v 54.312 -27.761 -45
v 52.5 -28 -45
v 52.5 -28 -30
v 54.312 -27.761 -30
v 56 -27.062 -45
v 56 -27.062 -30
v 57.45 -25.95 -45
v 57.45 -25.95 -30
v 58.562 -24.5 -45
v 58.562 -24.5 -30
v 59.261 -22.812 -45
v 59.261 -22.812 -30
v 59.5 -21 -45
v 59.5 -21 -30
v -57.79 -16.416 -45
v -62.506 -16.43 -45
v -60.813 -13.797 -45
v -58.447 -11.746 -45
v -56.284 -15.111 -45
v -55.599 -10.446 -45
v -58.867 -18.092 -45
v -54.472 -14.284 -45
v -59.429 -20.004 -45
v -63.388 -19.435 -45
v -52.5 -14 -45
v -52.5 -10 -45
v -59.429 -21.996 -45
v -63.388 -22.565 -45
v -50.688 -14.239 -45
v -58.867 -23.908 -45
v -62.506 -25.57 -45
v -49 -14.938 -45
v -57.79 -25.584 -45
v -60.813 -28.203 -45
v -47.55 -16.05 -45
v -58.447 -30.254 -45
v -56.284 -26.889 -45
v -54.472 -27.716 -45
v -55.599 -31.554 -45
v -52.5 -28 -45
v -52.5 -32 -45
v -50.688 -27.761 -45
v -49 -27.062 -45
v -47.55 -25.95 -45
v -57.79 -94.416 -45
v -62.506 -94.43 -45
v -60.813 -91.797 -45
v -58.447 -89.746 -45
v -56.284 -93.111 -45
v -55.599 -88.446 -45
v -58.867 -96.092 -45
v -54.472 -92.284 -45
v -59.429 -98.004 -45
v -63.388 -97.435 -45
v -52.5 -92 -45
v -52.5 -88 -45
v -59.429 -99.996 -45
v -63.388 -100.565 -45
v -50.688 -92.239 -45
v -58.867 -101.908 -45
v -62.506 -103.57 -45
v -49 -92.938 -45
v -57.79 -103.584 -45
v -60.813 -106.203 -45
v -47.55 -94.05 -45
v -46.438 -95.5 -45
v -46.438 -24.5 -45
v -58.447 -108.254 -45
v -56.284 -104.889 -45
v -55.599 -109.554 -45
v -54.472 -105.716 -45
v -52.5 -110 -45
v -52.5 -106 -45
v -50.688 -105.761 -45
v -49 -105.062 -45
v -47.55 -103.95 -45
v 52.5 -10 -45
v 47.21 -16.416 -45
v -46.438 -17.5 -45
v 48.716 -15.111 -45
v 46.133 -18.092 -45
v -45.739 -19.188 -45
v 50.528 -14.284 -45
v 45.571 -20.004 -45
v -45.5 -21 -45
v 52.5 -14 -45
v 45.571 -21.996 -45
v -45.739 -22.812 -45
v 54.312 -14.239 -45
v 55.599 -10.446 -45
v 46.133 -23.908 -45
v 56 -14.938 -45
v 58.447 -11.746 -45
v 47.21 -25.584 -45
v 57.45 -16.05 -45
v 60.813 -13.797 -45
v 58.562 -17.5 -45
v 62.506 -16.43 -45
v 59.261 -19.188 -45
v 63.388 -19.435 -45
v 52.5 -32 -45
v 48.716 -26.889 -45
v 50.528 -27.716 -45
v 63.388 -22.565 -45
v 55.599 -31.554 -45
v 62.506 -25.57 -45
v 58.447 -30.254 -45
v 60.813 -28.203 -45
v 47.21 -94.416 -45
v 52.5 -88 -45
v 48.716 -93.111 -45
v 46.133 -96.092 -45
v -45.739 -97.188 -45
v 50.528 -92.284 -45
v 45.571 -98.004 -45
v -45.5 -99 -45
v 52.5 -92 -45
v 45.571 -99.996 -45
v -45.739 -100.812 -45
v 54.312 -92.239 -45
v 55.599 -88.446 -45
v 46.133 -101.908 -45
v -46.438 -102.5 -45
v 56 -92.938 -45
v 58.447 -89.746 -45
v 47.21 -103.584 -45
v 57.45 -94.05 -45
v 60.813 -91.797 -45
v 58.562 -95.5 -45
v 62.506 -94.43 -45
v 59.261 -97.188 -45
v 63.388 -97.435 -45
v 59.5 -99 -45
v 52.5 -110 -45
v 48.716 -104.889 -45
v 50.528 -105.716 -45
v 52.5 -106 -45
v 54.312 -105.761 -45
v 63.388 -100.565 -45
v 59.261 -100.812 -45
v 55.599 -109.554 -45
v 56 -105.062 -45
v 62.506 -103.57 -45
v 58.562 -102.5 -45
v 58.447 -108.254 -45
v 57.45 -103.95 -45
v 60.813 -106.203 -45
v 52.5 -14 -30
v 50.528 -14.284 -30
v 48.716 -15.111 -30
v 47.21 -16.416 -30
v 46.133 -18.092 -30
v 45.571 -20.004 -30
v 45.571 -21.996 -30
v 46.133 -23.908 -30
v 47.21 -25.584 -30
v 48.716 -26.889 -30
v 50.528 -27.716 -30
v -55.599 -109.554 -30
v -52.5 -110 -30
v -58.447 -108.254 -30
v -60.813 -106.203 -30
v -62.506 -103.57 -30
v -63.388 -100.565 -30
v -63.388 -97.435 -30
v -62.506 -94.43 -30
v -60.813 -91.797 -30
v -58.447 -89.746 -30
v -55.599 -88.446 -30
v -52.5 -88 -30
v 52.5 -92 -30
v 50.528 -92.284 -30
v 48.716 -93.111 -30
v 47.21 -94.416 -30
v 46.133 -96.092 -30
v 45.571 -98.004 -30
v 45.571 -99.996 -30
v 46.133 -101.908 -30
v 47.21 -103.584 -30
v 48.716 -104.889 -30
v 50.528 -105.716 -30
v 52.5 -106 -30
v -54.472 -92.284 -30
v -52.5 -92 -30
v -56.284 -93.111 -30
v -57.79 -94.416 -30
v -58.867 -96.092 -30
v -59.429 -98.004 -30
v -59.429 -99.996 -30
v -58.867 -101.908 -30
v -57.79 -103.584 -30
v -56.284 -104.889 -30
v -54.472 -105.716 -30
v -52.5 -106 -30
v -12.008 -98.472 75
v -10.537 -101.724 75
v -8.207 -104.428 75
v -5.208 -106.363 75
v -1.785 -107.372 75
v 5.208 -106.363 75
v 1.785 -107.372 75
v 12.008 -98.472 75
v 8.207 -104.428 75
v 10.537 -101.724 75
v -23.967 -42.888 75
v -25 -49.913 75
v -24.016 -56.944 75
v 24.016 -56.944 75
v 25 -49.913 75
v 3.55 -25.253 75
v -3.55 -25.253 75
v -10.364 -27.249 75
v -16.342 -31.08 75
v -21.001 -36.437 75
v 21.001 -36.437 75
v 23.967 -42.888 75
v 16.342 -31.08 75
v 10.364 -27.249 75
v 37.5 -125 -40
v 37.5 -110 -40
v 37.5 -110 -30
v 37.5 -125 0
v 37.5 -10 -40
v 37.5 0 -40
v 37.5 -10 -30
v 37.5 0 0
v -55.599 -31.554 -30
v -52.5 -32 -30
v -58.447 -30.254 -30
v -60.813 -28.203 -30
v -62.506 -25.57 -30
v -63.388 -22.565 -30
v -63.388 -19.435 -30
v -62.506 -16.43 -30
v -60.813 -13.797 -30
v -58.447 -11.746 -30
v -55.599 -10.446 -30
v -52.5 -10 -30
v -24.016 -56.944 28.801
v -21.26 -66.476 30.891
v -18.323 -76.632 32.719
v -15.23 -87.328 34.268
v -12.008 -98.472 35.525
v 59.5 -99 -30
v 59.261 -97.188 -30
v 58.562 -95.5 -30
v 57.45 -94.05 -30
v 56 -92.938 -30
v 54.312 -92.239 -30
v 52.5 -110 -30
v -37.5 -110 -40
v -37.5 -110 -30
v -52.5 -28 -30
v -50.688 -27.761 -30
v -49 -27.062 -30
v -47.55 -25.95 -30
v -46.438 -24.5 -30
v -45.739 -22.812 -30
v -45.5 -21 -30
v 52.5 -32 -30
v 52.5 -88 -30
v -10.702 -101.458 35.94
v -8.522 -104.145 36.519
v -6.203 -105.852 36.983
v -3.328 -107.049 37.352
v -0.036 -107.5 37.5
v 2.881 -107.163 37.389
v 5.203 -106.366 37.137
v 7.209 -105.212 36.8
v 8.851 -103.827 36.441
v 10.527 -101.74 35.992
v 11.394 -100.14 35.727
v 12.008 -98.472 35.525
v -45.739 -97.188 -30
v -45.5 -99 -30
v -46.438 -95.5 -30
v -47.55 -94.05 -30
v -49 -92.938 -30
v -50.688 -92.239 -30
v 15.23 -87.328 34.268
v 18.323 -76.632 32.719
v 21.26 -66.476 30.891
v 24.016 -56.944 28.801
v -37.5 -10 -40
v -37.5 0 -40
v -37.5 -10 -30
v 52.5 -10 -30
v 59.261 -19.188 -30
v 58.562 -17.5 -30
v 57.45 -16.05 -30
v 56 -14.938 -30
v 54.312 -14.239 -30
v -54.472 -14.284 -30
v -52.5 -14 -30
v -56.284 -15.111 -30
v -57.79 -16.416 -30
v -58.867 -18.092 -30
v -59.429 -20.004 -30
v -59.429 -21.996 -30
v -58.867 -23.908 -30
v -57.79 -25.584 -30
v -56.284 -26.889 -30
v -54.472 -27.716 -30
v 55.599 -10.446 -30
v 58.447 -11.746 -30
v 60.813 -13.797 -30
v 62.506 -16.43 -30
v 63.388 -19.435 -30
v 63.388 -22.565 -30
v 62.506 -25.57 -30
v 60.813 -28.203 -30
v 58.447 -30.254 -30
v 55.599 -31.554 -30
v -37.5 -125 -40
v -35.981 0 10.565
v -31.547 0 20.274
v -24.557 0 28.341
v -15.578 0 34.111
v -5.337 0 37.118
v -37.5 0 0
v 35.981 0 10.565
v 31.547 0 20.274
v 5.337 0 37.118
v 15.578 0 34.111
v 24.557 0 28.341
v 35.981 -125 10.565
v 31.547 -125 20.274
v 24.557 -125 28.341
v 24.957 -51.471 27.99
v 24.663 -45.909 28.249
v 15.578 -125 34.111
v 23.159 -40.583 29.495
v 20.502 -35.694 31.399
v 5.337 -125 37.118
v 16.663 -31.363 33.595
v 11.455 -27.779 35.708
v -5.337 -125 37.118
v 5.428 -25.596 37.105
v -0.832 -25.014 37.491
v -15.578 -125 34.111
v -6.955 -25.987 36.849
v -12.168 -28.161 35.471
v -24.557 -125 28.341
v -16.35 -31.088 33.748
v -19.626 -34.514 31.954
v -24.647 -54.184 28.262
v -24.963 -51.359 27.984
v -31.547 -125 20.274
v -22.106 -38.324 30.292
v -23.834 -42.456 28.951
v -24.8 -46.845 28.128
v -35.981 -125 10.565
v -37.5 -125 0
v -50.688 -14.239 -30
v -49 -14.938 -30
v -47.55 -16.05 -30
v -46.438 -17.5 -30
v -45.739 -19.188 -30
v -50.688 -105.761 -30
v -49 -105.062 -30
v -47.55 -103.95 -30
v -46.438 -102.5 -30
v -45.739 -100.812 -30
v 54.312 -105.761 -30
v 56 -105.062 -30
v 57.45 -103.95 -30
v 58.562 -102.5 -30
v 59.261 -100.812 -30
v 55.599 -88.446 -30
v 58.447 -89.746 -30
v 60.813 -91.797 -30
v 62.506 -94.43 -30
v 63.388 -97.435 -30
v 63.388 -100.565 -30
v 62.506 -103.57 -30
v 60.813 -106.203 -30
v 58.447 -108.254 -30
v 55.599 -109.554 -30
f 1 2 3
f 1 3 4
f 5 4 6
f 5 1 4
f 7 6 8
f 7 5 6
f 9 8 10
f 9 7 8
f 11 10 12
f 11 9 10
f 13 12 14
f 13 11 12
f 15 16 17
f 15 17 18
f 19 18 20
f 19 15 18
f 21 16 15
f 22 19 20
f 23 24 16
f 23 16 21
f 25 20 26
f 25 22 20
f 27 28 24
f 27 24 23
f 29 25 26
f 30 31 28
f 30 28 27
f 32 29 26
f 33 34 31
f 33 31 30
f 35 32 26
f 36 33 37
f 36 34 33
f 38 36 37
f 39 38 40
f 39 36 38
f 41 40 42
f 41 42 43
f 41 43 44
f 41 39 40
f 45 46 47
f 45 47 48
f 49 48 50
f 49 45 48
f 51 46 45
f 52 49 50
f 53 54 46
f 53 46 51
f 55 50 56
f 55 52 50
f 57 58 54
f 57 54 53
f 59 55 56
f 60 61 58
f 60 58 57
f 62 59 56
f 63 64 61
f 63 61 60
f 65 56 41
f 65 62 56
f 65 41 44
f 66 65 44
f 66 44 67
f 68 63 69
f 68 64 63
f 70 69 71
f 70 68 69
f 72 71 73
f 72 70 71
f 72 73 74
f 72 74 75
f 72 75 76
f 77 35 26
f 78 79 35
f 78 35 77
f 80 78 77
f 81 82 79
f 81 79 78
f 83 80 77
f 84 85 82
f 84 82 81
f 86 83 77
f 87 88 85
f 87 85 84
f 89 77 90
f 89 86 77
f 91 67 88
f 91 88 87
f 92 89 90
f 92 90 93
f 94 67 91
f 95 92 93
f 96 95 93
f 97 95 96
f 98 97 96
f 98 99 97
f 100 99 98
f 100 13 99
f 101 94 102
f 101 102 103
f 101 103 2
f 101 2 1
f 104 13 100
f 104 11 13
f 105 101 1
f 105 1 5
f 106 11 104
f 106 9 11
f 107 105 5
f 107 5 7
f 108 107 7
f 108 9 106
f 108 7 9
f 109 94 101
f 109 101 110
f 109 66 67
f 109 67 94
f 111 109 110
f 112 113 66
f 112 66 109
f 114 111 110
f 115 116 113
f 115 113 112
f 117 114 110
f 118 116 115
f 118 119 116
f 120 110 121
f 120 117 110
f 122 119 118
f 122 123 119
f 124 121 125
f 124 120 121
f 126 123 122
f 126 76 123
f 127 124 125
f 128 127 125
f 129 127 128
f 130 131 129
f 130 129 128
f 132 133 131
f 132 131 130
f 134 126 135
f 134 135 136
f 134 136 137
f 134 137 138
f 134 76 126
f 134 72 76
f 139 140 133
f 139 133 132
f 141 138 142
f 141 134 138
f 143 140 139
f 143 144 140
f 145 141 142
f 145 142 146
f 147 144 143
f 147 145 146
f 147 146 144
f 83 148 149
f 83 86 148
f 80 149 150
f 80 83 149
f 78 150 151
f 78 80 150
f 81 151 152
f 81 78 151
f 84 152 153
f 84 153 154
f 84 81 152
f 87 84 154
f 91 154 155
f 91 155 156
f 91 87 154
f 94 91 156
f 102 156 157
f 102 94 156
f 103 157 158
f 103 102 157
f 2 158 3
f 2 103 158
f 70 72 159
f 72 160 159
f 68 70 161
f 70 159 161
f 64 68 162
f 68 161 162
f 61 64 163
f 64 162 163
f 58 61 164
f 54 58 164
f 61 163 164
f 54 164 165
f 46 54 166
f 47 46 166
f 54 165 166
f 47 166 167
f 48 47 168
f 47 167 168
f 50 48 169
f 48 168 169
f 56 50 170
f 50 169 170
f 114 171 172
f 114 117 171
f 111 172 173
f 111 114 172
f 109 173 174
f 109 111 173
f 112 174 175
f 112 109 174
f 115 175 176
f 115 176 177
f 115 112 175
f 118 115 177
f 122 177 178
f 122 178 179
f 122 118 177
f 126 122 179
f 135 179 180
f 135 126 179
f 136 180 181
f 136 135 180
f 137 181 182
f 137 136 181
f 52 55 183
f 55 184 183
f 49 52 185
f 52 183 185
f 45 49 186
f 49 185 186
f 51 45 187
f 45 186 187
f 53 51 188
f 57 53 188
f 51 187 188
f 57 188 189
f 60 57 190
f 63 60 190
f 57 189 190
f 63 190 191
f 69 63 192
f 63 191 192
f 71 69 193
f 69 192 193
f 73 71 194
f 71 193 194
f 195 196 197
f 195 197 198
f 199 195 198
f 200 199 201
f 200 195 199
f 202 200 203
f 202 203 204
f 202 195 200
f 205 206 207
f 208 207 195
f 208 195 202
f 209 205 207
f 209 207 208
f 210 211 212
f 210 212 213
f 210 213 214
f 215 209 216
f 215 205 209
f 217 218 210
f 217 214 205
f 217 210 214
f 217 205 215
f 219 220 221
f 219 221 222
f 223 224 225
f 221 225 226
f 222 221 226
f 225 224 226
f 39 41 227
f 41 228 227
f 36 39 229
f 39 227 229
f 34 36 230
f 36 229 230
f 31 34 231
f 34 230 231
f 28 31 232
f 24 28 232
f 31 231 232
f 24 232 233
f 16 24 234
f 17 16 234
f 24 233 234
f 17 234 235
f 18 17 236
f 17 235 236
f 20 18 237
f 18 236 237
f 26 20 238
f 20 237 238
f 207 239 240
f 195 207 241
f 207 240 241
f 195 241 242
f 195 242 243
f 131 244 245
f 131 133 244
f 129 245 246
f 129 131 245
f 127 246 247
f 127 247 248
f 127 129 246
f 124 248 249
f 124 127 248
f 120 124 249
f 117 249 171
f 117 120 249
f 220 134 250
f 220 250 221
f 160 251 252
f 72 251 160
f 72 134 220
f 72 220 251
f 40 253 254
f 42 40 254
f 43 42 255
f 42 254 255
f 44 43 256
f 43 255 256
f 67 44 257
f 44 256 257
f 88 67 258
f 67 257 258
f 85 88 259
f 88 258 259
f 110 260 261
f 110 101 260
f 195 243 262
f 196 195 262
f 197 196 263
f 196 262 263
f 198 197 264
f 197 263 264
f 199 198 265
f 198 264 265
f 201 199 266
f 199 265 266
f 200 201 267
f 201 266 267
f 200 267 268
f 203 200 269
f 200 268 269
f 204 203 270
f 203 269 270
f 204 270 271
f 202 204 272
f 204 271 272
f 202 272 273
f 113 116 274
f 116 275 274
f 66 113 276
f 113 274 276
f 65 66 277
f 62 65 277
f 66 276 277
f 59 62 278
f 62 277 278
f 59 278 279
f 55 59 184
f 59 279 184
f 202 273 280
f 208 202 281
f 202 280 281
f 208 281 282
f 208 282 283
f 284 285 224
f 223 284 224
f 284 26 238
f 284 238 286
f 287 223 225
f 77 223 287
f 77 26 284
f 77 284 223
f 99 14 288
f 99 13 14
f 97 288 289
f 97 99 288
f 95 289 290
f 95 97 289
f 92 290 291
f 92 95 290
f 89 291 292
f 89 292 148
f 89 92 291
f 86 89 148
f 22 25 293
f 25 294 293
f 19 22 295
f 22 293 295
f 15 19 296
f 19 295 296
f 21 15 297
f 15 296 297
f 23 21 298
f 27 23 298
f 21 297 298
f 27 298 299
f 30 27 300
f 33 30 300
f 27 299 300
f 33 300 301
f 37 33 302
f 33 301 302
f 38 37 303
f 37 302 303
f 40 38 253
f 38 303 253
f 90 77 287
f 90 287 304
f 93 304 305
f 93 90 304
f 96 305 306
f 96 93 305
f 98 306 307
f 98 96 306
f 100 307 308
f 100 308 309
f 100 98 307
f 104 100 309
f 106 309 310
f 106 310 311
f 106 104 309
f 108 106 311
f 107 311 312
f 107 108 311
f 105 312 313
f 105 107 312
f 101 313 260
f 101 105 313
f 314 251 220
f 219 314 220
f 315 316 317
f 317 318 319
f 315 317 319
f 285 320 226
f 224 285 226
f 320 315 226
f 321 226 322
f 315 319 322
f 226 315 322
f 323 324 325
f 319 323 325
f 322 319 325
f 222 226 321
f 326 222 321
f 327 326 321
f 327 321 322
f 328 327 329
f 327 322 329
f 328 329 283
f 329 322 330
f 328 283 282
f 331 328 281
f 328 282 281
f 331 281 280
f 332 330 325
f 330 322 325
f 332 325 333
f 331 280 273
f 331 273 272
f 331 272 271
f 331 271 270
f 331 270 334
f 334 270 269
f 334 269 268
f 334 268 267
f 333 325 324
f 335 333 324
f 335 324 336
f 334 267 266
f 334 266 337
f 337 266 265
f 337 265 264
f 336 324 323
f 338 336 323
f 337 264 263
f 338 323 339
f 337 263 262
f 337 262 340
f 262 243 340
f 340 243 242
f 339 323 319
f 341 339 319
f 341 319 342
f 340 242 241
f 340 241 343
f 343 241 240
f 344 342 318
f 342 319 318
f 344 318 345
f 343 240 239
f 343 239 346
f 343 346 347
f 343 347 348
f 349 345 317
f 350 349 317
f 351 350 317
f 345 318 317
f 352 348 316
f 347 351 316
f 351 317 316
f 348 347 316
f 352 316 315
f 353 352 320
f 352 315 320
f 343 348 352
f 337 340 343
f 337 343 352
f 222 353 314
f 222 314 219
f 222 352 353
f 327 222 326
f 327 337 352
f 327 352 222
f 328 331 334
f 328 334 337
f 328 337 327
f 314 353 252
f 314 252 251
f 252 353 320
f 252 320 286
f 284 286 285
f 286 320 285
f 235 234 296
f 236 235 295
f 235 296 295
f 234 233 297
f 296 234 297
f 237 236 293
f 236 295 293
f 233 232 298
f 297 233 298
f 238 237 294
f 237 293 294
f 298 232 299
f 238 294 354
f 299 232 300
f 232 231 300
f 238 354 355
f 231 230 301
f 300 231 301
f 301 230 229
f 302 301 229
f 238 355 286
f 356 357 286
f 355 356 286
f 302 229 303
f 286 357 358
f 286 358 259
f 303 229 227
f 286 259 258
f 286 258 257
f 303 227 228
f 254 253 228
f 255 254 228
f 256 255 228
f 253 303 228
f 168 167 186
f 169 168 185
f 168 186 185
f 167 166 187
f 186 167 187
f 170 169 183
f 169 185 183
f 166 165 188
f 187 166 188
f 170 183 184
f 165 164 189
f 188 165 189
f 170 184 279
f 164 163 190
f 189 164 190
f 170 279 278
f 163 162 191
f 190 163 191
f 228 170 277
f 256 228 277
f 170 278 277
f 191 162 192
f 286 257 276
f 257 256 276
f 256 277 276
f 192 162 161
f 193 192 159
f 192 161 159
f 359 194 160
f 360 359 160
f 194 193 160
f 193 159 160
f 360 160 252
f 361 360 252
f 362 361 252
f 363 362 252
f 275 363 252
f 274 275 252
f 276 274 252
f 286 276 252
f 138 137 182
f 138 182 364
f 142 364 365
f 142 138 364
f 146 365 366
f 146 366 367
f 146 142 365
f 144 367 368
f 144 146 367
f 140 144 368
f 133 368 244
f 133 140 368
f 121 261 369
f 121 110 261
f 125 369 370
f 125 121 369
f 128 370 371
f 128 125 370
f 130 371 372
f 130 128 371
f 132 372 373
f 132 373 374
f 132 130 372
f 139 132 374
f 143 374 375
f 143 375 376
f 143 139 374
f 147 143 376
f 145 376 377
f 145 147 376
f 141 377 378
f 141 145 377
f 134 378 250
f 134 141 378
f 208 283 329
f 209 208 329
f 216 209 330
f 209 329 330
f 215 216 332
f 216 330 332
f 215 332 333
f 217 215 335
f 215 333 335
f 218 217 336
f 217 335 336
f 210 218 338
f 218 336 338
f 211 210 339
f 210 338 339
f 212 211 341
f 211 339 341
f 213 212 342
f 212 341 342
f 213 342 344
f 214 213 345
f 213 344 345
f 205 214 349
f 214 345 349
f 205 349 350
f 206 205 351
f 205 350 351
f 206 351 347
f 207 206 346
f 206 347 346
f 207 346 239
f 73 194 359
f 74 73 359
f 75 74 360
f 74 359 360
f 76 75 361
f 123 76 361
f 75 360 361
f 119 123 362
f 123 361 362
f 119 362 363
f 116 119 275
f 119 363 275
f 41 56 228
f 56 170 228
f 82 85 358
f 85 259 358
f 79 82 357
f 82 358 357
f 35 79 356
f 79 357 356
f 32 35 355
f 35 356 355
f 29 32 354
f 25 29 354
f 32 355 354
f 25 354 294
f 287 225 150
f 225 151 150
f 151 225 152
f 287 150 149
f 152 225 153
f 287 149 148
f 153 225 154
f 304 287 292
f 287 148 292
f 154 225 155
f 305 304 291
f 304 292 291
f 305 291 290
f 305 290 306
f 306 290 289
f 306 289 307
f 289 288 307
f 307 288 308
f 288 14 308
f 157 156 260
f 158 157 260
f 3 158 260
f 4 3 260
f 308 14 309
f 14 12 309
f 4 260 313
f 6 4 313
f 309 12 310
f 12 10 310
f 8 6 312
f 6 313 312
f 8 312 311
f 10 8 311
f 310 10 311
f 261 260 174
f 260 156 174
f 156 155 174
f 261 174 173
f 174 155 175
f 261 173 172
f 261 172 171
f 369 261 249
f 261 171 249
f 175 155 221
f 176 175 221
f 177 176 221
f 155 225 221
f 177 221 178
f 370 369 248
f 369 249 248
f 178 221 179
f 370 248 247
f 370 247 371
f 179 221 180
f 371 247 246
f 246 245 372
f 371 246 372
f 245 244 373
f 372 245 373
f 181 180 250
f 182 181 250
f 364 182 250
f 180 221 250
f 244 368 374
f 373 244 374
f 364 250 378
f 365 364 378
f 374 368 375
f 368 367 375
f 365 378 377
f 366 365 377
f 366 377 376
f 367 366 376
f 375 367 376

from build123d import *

# Parameters (mm, degrees)
F1_DEPTH      = 125
F3_DEPTH      = 5
F3_DEPTH_BACK = 10
F5_DEPTH      = 75


with BuildPart() as f1:
    # F0 (on Front) → F1 (new body)
    with BuildSketch(Plane.XZ):
        with BuildLine():
            Line((-37.5, 0), (-37.5, -40))
            Line((-37.5, -40), (37.5, -40))
            Line((37.5, -40), (37.5, 0))
            ThreePointArc((37.5, 0), (0, 37.5), (-37.5, 0))
        make_face()
    extrude(amount=F1_DEPTH)

    # F2 (on face) → F3 (join, two sides)
    with BuildSketch(Plane(origin=(0, 0, -40), x_dir=(1, 0, 0), z_dir=(0, 0, -1))) as f3_sk:
        with BuildLine():
            Line((52.5, 106), (52.5, 110))
            Line((52.5, 110), (-52.5, 110))
            Line((-52.5, 110), (-52.5, 106))
            ThreePointArc((-52.5, 106), (-47.550253, 103.949747), (-45.5, 99))
            ThreePointArc((-45.5, 99), (-47.550253, 94.050253), (-52.5, 92))
            Line((-52.5, 92), (-52.5, 88))
            Line((-52.5, 88), (-52.5, 32))
            Line((-52.5, 32), (-52.5, 28))
            ThreePointArc((-52.5, 28), (-47.550253, 25.949747), (-45.5, 21))
            ThreePointArc((-45.5, 21), (-47.550253, 16.050253), (-52.5, 14))
            Line((-52.5, 14), (-52.5, 10))
            Line((-52.5, 10), (52.5, 10))
            Line((52.5, 10), (52.5, 14))
            ThreePointArc((52.5, 14), (45.5, 21), (52.5, 28))
            Line((52.5, 28), (52.5, 32))
            Line((52.5, 32), (52.5, 88))
            Line((52.5, 88), (52.5, 92))
            ThreePointArc((52.5, 92), (45.5, 99), (52.5, 106))
        make_face()
        with BuildLine():
            ThreePointArc((52.5, 88), (63.5, 99), (52.5, 110))
            Line((52.5, 110), (52.5, 106))
            ThreePointArc((52.5, 106), (57.449747, 103.949747), (59.5, 99))
            ThreePointArc((59.5, 99), (57.449747, 94.050253), (52.5, 92))
            Line((52.5, 92), (52.5, 88))
        make_face()
        with BuildLine():
            Line((-52.5, 106), (-52.5, 110))
            ThreePointArc((-52.5, 110), (-63.5, 99), (-52.5, 88))
            Line((-52.5, 88), (-52.5, 92))
            ThreePointArc((-52.5, 92), (-59.5, 99), (-52.5, 106))
        make_face()
        with BuildLine():
            ThreePointArc((52.5, 10), (63.5, 21), (52.5, 32))
            Line((52.5, 32), (52.5, 28))
            ThreePointArc((52.5, 28), (57.449747, 25.949747), (59.5, 21))
            ThreePointArc((59.5, 21), (57.449747, 16.050253), (52.5, 14))
            Line((52.5, 14), (52.5, 10))
        make_face()
        with BuildLine():
            Line((-52.5, 28), (-52.5, 32))
            ThreePointArc((-52.5, 32), (-63.5, 21), (-52.5, 10))
            Line((-52.5, 10), (-52.5, 14))
            ThreePointArc((-52.5, 14), (-59.5, 21), (-52.5, 28))
        make_face()
    extrude(amount=F3_DEPTH)
    extrude(f3_sk.sketch, amount=-F3_DEPTH_BACK)

    # F4 (on Top) → F5 (join)
    with BuildSketch(Plane.XY):
        with BuildLine():
            Line((-24.016134, -56.944444), (-12.008067, -98.472222))
            ThreePointArc((-12.008067, -98.472222), (0, -107.5), (12.008067, -98.472222))
            Line((12.008067, -98.472222), (24.016134, -56.944444))
            ThreePointArc((24.016134, -56.944444), (0, -25), (-24.016134, -56.944444))
        make_face()
    extrude(amount=F5_DEPTH)


solid = f1.part
